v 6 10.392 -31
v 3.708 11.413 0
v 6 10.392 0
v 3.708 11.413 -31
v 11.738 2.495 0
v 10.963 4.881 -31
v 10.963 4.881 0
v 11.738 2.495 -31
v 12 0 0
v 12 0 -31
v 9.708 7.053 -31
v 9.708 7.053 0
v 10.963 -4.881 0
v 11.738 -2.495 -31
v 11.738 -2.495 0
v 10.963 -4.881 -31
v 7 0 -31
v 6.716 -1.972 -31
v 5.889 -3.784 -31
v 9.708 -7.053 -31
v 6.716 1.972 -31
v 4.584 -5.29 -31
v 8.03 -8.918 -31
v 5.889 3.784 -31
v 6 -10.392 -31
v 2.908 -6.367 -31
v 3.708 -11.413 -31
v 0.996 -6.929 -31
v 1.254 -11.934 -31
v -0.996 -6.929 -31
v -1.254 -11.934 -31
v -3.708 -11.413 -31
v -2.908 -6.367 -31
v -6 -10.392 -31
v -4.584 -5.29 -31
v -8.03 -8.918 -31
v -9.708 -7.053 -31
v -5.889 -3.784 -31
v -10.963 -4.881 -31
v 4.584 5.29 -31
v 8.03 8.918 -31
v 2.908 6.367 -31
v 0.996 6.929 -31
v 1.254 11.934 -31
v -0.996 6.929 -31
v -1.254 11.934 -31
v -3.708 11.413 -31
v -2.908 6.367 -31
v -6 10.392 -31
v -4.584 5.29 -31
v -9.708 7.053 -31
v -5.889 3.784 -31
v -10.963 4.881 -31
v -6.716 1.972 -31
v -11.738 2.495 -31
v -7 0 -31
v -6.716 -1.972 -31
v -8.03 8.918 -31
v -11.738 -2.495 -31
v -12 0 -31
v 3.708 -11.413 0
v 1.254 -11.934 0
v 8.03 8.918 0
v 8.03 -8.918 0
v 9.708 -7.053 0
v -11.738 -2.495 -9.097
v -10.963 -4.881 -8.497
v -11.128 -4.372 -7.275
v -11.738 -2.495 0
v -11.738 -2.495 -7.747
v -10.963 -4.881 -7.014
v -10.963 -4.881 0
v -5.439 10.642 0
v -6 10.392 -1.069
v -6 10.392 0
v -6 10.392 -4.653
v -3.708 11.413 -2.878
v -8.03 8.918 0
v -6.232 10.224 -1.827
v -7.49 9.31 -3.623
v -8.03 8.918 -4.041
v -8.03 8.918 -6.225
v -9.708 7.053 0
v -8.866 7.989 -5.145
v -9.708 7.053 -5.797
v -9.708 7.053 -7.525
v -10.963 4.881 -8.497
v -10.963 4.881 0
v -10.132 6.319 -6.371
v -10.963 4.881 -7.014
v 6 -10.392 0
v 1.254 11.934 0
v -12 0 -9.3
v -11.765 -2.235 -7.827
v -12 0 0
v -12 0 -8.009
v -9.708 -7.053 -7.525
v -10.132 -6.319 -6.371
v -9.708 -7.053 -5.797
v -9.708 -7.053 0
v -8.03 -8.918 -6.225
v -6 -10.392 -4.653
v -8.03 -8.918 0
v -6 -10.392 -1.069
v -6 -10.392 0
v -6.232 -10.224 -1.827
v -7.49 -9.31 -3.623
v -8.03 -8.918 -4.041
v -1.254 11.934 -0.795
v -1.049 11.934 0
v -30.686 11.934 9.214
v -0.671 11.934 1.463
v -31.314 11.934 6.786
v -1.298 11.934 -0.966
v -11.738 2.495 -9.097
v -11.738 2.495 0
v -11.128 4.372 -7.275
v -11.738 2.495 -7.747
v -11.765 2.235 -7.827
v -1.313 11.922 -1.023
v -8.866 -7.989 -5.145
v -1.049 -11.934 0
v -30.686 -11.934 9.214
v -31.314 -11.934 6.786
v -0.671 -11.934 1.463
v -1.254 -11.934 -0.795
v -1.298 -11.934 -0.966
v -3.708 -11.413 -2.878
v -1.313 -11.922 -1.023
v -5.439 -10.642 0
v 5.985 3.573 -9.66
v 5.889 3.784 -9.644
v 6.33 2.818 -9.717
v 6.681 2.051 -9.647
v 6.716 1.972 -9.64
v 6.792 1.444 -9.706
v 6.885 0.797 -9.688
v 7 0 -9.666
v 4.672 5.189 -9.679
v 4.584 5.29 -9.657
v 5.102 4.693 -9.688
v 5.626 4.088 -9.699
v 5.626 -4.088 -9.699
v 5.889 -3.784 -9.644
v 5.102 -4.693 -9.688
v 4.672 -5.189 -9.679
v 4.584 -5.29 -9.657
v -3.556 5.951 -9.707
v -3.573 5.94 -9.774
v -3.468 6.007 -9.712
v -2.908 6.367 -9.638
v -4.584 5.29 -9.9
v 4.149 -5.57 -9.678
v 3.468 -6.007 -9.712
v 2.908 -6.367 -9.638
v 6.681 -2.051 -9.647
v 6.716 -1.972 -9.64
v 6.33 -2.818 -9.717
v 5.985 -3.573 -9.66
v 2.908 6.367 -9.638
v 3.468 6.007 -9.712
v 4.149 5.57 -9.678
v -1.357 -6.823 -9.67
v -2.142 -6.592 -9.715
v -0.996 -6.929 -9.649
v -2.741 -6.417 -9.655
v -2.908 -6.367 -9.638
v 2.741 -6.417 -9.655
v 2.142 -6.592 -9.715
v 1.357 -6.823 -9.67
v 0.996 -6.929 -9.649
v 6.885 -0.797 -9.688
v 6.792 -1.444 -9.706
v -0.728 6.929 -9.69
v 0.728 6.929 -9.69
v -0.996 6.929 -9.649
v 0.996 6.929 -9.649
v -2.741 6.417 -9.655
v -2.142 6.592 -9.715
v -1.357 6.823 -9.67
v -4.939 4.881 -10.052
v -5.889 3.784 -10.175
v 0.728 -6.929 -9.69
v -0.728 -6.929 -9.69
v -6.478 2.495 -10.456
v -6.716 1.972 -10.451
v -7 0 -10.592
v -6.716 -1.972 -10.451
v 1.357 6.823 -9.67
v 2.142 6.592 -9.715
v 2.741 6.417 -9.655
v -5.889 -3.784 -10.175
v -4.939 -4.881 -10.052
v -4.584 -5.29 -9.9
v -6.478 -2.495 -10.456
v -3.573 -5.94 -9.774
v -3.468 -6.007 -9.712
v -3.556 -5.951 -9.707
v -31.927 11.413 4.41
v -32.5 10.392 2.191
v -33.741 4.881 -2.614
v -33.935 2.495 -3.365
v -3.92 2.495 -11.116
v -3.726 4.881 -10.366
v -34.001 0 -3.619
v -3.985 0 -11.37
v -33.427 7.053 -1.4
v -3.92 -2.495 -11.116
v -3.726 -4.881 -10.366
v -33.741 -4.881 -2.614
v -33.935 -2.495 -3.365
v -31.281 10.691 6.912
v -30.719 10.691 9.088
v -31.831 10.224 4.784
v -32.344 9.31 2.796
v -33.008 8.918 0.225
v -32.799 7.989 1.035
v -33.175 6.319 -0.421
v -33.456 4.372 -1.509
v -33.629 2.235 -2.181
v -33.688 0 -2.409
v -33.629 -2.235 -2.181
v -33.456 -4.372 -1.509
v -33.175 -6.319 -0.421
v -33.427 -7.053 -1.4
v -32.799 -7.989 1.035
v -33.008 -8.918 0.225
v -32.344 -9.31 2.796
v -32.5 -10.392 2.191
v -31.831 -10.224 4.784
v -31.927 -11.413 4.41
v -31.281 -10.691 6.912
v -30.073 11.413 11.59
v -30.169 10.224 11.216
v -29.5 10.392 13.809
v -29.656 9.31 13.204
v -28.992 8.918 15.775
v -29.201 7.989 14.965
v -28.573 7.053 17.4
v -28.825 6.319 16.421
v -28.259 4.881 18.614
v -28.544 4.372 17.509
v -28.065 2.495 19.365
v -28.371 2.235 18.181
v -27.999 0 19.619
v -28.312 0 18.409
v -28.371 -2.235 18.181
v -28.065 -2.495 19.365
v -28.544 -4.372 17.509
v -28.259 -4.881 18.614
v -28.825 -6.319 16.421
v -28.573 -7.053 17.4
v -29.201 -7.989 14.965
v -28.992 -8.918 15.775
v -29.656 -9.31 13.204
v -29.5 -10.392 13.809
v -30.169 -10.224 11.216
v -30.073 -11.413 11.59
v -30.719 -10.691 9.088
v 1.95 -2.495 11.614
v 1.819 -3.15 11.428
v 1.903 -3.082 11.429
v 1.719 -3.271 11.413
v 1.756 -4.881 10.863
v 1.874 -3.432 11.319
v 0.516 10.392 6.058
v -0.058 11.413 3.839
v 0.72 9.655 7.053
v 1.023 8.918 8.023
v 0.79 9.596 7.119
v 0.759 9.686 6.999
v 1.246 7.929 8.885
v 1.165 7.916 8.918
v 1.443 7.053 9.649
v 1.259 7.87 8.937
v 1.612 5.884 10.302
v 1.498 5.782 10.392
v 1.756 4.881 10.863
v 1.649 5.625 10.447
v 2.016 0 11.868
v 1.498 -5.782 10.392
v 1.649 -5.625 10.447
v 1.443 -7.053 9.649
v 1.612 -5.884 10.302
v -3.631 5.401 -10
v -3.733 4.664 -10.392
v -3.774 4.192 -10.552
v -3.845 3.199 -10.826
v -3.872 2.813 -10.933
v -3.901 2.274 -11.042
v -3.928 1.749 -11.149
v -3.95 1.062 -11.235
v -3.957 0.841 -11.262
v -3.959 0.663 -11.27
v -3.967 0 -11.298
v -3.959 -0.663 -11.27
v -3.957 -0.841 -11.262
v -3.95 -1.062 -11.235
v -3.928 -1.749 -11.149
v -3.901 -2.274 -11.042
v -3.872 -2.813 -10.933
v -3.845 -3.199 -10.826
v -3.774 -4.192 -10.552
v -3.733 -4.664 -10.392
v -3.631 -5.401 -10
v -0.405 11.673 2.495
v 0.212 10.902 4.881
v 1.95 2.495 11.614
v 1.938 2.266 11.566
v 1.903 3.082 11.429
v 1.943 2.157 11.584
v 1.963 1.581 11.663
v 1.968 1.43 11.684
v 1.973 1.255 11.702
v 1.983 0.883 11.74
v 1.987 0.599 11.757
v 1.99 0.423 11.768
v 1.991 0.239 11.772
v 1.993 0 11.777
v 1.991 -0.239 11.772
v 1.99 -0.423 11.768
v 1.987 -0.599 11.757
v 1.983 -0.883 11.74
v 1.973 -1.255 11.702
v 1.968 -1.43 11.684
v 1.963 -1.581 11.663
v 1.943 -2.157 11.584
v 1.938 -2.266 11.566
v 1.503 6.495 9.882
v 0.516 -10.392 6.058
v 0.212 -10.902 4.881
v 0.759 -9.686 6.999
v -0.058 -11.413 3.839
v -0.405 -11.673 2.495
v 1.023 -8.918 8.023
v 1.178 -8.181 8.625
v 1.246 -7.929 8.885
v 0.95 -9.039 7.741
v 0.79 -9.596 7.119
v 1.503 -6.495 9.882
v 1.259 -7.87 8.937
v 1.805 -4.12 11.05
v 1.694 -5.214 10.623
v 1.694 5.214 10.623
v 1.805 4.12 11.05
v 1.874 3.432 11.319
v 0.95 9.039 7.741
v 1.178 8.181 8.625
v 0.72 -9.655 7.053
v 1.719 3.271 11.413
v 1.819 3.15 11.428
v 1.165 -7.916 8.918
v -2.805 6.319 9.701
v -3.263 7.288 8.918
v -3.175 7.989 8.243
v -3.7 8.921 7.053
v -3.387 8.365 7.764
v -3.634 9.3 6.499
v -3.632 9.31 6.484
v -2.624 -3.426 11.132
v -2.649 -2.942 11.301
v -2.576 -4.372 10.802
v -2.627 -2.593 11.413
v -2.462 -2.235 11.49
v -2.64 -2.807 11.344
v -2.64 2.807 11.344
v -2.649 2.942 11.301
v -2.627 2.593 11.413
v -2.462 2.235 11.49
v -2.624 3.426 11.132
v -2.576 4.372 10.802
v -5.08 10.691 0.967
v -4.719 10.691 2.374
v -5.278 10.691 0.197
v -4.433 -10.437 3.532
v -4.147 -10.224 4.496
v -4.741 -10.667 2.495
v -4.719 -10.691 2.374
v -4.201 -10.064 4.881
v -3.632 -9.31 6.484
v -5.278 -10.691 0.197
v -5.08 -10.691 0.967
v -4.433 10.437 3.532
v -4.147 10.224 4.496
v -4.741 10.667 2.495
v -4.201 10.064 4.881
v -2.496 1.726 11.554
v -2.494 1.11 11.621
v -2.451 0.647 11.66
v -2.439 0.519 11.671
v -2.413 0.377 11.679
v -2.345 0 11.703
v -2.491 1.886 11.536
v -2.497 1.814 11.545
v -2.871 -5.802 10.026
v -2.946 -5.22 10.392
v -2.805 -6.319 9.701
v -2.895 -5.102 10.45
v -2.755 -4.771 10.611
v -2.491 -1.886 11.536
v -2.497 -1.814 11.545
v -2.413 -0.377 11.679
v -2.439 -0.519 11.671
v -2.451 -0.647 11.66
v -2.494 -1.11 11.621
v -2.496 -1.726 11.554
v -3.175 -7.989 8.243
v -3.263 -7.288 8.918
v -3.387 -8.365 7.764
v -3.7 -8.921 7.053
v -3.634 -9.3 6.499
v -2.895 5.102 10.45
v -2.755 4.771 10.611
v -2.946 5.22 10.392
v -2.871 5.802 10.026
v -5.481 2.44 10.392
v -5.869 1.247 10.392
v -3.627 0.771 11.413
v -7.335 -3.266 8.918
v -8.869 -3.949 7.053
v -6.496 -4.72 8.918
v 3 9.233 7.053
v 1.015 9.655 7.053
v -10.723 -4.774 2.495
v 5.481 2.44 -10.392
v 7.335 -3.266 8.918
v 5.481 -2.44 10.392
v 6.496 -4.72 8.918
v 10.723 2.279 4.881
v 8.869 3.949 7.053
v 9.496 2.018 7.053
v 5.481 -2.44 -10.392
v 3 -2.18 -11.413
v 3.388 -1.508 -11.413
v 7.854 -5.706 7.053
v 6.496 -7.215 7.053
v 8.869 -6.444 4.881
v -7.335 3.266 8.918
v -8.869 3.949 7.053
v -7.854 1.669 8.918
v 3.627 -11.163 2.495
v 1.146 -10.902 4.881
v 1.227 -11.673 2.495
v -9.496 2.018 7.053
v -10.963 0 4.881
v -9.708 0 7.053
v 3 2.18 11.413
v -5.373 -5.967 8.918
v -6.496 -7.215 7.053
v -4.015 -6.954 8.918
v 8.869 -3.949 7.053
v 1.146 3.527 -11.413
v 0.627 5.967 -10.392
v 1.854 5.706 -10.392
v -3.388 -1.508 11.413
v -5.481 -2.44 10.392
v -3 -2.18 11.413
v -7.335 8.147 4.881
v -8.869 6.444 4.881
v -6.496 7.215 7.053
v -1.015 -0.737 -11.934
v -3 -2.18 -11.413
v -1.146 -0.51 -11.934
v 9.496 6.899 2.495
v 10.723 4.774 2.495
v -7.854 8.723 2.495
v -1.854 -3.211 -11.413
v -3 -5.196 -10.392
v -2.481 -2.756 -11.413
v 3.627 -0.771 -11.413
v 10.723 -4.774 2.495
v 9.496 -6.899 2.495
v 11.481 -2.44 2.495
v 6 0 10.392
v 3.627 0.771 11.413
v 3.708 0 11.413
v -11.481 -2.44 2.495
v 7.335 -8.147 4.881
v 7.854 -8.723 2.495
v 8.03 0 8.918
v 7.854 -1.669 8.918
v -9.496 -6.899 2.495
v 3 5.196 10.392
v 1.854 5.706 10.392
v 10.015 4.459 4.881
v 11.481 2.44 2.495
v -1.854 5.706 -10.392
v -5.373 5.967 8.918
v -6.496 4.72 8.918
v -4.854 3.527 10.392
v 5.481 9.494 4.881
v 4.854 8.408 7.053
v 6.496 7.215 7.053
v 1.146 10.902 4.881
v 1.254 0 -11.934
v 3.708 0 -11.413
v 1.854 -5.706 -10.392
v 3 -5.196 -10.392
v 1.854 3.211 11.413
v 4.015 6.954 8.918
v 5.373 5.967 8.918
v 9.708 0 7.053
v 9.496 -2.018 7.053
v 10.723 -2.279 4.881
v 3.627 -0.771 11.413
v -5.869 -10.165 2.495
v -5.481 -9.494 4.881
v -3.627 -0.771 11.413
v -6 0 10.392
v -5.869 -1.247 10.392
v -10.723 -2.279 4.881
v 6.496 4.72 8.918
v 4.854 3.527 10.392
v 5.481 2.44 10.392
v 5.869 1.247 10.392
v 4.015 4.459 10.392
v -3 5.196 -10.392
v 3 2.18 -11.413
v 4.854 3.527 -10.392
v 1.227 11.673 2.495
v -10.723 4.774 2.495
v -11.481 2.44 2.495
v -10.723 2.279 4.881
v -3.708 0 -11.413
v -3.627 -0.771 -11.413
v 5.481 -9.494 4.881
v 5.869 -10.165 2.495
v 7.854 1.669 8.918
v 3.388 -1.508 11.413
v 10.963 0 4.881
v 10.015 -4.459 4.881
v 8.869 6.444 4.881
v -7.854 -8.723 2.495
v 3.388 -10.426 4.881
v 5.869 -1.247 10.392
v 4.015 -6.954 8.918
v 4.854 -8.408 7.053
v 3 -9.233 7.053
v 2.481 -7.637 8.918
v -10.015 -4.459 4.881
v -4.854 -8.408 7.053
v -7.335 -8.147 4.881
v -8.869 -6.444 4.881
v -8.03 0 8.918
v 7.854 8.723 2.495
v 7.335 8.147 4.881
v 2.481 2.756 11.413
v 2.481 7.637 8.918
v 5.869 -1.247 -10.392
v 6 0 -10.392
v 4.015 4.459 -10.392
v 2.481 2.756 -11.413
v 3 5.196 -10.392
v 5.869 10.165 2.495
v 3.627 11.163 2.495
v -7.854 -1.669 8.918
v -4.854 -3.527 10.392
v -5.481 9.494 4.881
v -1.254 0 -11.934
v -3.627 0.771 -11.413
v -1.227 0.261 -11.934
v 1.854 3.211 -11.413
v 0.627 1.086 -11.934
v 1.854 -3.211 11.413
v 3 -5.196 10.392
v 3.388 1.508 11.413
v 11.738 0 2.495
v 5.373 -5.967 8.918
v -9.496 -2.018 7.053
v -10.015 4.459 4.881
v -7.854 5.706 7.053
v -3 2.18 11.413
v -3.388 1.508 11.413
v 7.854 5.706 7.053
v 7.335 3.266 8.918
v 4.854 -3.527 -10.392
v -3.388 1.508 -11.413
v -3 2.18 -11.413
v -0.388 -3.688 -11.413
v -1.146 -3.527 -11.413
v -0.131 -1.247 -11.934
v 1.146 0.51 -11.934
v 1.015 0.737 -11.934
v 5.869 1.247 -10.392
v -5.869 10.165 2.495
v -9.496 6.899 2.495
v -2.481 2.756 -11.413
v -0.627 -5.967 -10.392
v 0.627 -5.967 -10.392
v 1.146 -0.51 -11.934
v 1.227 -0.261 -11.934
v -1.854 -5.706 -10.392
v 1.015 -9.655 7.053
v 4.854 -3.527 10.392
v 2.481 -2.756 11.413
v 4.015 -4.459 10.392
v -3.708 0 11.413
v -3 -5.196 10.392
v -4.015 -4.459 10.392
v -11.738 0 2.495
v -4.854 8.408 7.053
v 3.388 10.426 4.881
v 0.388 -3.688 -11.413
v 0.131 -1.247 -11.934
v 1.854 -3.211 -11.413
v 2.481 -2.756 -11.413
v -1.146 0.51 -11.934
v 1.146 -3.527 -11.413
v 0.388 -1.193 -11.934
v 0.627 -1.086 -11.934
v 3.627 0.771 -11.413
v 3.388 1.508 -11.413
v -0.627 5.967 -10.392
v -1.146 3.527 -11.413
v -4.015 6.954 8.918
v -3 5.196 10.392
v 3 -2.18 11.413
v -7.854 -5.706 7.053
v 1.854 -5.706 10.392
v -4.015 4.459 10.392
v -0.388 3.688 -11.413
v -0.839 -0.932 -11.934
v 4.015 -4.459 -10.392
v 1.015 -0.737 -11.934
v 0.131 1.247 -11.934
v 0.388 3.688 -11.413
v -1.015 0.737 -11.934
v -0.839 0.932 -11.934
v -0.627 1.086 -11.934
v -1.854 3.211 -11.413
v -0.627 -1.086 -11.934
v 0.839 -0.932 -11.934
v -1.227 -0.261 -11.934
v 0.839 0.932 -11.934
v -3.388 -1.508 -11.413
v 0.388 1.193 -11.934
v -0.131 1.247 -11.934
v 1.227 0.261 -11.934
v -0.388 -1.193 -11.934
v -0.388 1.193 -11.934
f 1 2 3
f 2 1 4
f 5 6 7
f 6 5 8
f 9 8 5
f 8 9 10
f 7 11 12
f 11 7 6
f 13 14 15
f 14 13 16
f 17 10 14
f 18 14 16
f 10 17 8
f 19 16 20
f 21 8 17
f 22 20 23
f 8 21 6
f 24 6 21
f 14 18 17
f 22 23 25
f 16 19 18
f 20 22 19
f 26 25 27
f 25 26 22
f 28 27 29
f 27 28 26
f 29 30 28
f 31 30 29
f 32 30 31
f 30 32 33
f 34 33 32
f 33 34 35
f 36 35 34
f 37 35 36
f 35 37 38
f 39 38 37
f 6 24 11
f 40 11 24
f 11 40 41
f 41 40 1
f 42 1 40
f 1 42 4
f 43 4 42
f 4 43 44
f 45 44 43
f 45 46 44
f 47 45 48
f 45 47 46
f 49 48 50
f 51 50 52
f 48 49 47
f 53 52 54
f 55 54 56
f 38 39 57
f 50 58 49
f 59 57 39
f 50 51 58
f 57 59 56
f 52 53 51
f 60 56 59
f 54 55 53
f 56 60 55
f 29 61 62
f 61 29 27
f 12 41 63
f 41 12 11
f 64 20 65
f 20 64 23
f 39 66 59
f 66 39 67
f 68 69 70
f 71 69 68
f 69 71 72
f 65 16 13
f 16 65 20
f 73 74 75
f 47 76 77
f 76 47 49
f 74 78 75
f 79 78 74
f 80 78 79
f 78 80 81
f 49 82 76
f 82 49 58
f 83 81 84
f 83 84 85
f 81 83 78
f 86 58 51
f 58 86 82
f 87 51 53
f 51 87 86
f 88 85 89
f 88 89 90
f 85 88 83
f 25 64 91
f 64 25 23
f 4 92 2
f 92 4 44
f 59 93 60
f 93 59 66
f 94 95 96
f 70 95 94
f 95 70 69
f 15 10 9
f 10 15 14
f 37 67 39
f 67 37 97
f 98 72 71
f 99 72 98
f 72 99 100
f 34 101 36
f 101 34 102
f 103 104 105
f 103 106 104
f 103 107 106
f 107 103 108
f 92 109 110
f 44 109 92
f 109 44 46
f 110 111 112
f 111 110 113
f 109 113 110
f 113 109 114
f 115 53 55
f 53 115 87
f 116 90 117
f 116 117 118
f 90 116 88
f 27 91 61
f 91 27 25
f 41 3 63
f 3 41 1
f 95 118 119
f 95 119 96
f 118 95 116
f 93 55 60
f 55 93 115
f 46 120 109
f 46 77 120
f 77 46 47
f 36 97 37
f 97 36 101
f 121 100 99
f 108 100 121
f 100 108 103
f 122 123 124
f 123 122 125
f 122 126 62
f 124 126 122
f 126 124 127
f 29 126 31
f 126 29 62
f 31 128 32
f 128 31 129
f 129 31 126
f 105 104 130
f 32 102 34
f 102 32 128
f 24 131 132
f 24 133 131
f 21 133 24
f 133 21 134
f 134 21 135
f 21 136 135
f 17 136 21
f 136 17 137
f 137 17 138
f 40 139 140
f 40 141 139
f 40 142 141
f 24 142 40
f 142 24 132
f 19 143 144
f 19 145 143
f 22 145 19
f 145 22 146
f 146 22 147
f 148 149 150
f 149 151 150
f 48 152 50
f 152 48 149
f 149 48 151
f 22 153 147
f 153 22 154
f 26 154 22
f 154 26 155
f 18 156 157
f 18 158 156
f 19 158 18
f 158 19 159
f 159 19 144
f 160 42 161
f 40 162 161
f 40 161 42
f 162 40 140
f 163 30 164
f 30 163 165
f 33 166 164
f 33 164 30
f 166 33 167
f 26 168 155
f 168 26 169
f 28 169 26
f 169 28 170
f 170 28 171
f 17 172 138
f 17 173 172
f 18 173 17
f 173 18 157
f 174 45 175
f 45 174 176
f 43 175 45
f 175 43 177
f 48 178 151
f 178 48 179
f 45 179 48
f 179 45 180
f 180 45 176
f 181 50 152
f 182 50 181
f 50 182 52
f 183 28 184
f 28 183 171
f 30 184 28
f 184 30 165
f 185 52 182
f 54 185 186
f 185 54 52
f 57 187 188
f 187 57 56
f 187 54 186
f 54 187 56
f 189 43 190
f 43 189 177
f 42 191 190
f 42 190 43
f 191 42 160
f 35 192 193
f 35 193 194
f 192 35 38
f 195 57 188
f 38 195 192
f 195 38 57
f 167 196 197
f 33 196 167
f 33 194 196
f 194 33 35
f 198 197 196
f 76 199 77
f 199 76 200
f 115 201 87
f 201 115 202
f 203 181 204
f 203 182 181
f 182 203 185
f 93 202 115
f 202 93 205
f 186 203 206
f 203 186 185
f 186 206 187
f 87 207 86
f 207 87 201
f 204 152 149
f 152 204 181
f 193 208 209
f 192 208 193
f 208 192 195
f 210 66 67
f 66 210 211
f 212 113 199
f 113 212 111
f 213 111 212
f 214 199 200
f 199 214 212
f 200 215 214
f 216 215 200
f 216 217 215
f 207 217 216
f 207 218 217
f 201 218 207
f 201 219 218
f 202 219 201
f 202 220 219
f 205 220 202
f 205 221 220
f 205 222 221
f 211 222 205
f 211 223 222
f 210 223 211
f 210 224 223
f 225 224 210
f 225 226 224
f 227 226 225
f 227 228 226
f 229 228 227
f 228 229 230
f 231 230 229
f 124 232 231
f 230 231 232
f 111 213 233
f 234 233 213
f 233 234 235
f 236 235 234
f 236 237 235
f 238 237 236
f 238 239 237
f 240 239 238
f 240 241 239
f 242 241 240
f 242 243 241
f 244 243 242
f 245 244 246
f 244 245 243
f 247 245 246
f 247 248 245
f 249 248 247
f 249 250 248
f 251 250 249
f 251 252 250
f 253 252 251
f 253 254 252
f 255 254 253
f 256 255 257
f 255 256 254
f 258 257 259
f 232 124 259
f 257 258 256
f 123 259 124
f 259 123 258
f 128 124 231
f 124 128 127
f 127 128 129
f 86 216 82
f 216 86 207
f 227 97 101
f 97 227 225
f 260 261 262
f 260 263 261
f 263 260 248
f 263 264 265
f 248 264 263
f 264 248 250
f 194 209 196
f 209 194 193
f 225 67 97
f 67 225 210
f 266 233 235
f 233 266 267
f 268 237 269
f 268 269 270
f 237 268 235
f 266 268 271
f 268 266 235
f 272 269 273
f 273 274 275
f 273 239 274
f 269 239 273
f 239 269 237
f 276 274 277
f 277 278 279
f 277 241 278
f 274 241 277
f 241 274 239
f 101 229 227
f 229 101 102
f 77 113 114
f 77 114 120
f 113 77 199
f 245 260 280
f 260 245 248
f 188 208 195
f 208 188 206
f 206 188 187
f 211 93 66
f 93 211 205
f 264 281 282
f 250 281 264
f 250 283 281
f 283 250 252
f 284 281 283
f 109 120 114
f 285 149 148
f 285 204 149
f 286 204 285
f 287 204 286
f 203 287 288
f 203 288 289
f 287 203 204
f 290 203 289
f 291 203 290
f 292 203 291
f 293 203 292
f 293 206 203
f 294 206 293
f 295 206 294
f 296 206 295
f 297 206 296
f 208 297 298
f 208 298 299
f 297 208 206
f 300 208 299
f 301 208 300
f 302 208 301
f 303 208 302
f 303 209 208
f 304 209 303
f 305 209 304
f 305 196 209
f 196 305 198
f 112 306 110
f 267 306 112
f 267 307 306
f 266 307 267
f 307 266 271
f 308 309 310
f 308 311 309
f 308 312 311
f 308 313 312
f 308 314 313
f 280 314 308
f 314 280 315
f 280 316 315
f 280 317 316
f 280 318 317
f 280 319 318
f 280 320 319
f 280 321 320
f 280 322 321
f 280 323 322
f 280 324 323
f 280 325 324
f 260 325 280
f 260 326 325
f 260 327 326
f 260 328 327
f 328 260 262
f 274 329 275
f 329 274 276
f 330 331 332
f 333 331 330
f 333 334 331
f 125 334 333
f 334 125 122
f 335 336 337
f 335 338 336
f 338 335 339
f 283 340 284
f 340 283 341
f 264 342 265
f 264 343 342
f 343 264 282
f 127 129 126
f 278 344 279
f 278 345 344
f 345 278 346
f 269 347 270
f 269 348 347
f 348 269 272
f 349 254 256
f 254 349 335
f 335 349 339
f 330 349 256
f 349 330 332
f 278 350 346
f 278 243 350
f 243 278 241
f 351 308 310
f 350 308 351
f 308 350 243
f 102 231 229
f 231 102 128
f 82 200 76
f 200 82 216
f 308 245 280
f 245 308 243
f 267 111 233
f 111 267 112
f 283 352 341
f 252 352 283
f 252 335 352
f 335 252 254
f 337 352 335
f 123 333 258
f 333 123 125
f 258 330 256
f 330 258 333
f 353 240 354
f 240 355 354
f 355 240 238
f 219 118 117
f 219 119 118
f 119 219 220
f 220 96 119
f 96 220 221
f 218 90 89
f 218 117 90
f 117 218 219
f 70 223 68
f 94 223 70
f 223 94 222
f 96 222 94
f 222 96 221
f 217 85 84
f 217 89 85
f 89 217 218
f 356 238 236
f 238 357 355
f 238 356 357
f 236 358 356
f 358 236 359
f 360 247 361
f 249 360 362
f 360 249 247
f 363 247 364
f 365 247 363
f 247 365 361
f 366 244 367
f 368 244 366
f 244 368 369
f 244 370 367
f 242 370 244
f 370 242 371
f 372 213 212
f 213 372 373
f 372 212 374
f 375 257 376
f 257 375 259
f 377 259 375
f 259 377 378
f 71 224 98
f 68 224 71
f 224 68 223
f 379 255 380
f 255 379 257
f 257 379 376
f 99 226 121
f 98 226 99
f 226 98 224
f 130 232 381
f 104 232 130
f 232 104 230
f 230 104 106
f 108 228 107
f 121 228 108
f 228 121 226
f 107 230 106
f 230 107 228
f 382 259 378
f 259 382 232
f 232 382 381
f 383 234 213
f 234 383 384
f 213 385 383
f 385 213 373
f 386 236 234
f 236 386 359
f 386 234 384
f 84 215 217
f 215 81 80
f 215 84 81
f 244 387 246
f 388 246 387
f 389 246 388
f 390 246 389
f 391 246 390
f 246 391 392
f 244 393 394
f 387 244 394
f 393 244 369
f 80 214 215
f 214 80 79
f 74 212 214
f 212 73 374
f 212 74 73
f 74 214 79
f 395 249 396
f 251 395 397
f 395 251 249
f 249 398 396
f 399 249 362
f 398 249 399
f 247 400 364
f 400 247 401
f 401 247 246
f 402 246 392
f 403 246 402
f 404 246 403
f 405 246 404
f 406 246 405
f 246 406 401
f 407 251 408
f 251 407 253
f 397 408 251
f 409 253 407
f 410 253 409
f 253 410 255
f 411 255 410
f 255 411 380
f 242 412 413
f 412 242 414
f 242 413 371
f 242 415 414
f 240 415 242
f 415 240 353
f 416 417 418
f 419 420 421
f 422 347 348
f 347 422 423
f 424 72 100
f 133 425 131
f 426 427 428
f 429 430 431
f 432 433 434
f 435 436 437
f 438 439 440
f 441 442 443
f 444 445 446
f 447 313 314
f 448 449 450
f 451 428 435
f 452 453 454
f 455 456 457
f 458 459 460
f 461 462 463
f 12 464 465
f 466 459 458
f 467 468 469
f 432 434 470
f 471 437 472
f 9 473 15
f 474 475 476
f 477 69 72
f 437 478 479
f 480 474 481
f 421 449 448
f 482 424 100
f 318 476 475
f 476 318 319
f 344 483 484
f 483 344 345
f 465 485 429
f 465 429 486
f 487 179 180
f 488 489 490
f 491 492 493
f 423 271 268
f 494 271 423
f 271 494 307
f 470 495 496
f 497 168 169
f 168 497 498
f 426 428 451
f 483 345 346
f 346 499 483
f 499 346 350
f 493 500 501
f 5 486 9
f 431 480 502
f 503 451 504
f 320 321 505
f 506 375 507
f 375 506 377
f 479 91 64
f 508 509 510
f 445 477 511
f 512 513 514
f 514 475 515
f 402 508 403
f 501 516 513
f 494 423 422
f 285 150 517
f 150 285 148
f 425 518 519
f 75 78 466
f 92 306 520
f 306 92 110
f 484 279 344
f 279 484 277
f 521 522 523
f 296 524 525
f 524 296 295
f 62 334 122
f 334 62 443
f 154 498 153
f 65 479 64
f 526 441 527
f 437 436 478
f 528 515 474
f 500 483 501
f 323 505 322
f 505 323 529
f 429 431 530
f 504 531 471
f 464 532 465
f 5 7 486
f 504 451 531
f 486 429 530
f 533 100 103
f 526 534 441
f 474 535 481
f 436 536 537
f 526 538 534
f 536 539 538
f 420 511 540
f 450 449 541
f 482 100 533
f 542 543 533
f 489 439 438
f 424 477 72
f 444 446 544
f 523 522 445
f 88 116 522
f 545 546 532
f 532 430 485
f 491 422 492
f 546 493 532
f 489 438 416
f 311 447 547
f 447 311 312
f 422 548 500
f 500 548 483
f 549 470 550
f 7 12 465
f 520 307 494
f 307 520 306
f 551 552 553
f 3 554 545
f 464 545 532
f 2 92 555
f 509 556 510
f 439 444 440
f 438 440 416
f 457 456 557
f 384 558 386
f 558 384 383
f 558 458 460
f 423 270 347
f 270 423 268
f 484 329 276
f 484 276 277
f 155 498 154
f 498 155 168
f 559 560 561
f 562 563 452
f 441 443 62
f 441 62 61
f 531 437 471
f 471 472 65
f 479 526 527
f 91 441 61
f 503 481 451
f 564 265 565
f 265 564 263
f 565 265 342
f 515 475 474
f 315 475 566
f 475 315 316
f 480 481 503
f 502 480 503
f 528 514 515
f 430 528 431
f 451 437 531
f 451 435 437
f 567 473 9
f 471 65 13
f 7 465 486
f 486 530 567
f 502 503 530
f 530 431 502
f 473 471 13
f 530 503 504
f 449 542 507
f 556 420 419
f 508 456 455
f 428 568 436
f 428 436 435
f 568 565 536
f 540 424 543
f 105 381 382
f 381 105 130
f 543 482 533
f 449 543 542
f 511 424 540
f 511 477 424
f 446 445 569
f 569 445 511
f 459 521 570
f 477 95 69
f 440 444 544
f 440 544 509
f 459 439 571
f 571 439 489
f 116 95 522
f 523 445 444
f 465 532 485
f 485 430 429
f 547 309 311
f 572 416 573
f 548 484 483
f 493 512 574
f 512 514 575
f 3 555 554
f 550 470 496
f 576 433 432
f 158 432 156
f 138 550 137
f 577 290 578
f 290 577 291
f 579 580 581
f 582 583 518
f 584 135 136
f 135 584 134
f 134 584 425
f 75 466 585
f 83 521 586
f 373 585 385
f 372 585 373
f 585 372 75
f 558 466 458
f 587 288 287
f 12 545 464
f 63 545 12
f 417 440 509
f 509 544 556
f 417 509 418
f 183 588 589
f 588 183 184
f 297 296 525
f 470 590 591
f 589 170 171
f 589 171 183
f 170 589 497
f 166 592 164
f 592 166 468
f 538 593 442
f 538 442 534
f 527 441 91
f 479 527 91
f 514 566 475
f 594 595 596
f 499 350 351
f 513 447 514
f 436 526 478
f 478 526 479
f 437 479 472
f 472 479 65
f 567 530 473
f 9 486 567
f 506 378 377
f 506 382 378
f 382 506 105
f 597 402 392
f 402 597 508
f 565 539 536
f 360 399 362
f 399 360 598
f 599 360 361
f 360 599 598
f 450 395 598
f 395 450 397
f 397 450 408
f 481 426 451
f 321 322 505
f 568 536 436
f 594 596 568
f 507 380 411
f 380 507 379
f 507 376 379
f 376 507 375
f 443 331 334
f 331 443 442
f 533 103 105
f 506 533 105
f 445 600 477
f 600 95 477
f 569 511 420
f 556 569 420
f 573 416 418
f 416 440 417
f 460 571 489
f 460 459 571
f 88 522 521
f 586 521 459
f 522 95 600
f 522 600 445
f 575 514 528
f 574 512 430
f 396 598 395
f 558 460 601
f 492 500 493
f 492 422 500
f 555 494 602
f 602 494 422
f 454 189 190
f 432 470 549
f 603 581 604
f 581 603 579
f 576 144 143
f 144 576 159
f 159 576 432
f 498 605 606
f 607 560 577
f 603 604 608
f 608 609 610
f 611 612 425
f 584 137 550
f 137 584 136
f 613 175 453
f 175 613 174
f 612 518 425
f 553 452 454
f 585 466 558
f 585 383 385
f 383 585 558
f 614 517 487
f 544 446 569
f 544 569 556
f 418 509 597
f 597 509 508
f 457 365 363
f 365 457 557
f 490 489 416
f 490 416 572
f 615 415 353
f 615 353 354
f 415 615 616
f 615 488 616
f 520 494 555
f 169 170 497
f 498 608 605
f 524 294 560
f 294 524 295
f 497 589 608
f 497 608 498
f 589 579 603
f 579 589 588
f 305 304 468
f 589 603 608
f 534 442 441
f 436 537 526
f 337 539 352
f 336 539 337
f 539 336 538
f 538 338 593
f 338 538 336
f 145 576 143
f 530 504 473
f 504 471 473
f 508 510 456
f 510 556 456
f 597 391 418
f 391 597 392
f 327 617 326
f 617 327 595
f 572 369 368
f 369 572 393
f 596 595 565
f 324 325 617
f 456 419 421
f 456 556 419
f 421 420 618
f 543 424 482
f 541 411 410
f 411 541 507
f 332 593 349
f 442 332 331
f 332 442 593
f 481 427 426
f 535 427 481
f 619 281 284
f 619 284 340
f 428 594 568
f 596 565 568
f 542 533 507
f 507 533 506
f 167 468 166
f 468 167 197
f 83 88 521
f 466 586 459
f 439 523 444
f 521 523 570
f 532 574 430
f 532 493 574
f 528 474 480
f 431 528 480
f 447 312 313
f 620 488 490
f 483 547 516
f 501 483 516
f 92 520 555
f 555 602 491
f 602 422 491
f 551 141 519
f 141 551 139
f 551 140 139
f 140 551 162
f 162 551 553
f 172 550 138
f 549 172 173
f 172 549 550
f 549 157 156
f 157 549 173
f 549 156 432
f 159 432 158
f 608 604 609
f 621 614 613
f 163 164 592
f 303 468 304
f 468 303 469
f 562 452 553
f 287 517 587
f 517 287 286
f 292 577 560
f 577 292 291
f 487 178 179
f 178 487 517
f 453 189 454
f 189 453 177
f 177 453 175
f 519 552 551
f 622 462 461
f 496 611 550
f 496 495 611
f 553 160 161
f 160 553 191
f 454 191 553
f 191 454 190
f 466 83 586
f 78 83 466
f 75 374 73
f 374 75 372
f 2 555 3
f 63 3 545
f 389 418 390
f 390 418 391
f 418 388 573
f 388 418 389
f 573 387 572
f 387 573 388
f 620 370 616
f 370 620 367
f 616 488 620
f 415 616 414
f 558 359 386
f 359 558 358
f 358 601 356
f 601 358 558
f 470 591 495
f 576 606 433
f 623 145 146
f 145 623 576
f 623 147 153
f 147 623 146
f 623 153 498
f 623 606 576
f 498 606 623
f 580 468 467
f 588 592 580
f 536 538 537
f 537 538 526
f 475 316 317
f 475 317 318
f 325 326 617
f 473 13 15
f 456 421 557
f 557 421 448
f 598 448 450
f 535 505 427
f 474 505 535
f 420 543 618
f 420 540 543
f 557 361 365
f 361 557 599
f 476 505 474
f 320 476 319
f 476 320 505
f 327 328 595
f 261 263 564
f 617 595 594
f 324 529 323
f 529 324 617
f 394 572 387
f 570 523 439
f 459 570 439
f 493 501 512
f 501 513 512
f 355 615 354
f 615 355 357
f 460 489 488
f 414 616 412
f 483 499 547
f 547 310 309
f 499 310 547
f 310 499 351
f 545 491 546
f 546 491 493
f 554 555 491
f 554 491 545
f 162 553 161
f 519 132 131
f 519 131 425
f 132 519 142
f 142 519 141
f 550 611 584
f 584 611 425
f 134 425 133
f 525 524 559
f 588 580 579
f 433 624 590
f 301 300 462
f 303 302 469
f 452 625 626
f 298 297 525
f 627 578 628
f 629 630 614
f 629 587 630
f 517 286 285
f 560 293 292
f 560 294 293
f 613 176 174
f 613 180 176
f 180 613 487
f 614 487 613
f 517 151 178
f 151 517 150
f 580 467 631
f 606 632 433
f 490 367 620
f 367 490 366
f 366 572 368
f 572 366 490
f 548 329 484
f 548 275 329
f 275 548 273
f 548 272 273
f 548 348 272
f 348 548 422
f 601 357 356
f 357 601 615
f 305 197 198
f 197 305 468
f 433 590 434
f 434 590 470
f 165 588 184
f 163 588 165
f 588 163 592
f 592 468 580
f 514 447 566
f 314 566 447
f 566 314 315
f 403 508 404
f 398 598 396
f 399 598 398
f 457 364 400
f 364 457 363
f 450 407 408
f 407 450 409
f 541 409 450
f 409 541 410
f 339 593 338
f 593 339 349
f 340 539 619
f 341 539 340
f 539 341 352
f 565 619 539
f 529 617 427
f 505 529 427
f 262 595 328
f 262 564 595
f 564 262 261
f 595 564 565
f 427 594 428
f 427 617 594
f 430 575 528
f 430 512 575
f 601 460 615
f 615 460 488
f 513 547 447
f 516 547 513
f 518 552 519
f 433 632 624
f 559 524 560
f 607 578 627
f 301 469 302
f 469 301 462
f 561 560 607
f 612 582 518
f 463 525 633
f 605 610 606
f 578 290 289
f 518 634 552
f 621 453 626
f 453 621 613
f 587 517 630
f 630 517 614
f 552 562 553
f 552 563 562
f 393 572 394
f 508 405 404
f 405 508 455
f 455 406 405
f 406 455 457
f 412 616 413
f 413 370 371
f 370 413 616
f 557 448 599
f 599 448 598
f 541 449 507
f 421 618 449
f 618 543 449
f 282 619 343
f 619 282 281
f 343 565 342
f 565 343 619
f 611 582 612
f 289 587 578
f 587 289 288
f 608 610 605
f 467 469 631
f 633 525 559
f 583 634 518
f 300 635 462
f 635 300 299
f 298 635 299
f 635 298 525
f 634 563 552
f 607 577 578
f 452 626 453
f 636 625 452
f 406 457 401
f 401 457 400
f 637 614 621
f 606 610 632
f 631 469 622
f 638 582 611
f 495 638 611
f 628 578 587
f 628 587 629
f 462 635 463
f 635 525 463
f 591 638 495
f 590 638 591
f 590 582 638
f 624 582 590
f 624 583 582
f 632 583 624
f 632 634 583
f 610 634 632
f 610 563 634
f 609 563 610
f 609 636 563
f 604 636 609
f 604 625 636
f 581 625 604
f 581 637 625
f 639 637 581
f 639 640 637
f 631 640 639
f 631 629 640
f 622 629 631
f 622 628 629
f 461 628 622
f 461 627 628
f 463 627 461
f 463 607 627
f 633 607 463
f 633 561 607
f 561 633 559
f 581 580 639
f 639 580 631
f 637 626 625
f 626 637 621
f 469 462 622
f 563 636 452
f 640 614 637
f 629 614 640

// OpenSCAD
width=10;

sphere (12);

//cylinder 1 z たて
difference(){
    translate ([0,0,-31])cylinder(h=31, d=24);
    translate([0,0,-33])cylinder(h=30, d=14);
}



//cylinder 3        
translate([-31,0,8]) rotate([0,104.48,0])difference(){
        cylinder (h=31, d=24);
        translate([0,0,+3]) ;
        cylinder(h=30, d=21.5); 
        }
